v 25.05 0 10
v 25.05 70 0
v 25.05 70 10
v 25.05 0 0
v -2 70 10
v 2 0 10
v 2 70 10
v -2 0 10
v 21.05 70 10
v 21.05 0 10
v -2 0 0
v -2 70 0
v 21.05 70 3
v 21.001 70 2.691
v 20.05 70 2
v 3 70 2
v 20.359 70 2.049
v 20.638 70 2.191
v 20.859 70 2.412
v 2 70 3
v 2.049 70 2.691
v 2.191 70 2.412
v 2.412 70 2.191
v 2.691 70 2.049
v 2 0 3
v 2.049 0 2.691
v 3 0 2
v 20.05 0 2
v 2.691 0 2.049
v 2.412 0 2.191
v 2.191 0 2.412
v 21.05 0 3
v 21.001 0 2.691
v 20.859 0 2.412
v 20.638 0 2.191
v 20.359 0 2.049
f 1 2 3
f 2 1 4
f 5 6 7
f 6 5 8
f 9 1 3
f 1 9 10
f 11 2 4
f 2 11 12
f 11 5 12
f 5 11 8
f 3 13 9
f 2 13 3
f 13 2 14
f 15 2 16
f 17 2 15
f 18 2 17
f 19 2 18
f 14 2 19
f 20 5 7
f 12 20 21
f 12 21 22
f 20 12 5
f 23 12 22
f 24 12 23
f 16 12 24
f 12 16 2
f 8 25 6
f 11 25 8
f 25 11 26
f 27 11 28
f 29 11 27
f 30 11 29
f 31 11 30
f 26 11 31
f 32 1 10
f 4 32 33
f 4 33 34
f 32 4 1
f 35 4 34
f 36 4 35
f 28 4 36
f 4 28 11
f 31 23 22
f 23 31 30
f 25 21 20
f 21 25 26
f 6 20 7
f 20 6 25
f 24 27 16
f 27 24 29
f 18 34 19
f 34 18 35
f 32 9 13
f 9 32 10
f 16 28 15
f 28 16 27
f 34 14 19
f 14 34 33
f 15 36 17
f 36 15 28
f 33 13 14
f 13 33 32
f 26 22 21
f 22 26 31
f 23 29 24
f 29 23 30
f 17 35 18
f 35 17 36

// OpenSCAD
jigw=inches(.75);
difference() {
  translate([-2,0]) cube([jigw+8,70,10]);
  translate([3,-.01,3]) rotate([-90,0]) linear_extrude(70.02) {
    hull() {
      for(x=[0,jigw-2],y=[0,-10]) translate([x,y]) circle(r=1,$fn=20);
      
    }
  }
}
function inches(in) = 25.4 * in;
